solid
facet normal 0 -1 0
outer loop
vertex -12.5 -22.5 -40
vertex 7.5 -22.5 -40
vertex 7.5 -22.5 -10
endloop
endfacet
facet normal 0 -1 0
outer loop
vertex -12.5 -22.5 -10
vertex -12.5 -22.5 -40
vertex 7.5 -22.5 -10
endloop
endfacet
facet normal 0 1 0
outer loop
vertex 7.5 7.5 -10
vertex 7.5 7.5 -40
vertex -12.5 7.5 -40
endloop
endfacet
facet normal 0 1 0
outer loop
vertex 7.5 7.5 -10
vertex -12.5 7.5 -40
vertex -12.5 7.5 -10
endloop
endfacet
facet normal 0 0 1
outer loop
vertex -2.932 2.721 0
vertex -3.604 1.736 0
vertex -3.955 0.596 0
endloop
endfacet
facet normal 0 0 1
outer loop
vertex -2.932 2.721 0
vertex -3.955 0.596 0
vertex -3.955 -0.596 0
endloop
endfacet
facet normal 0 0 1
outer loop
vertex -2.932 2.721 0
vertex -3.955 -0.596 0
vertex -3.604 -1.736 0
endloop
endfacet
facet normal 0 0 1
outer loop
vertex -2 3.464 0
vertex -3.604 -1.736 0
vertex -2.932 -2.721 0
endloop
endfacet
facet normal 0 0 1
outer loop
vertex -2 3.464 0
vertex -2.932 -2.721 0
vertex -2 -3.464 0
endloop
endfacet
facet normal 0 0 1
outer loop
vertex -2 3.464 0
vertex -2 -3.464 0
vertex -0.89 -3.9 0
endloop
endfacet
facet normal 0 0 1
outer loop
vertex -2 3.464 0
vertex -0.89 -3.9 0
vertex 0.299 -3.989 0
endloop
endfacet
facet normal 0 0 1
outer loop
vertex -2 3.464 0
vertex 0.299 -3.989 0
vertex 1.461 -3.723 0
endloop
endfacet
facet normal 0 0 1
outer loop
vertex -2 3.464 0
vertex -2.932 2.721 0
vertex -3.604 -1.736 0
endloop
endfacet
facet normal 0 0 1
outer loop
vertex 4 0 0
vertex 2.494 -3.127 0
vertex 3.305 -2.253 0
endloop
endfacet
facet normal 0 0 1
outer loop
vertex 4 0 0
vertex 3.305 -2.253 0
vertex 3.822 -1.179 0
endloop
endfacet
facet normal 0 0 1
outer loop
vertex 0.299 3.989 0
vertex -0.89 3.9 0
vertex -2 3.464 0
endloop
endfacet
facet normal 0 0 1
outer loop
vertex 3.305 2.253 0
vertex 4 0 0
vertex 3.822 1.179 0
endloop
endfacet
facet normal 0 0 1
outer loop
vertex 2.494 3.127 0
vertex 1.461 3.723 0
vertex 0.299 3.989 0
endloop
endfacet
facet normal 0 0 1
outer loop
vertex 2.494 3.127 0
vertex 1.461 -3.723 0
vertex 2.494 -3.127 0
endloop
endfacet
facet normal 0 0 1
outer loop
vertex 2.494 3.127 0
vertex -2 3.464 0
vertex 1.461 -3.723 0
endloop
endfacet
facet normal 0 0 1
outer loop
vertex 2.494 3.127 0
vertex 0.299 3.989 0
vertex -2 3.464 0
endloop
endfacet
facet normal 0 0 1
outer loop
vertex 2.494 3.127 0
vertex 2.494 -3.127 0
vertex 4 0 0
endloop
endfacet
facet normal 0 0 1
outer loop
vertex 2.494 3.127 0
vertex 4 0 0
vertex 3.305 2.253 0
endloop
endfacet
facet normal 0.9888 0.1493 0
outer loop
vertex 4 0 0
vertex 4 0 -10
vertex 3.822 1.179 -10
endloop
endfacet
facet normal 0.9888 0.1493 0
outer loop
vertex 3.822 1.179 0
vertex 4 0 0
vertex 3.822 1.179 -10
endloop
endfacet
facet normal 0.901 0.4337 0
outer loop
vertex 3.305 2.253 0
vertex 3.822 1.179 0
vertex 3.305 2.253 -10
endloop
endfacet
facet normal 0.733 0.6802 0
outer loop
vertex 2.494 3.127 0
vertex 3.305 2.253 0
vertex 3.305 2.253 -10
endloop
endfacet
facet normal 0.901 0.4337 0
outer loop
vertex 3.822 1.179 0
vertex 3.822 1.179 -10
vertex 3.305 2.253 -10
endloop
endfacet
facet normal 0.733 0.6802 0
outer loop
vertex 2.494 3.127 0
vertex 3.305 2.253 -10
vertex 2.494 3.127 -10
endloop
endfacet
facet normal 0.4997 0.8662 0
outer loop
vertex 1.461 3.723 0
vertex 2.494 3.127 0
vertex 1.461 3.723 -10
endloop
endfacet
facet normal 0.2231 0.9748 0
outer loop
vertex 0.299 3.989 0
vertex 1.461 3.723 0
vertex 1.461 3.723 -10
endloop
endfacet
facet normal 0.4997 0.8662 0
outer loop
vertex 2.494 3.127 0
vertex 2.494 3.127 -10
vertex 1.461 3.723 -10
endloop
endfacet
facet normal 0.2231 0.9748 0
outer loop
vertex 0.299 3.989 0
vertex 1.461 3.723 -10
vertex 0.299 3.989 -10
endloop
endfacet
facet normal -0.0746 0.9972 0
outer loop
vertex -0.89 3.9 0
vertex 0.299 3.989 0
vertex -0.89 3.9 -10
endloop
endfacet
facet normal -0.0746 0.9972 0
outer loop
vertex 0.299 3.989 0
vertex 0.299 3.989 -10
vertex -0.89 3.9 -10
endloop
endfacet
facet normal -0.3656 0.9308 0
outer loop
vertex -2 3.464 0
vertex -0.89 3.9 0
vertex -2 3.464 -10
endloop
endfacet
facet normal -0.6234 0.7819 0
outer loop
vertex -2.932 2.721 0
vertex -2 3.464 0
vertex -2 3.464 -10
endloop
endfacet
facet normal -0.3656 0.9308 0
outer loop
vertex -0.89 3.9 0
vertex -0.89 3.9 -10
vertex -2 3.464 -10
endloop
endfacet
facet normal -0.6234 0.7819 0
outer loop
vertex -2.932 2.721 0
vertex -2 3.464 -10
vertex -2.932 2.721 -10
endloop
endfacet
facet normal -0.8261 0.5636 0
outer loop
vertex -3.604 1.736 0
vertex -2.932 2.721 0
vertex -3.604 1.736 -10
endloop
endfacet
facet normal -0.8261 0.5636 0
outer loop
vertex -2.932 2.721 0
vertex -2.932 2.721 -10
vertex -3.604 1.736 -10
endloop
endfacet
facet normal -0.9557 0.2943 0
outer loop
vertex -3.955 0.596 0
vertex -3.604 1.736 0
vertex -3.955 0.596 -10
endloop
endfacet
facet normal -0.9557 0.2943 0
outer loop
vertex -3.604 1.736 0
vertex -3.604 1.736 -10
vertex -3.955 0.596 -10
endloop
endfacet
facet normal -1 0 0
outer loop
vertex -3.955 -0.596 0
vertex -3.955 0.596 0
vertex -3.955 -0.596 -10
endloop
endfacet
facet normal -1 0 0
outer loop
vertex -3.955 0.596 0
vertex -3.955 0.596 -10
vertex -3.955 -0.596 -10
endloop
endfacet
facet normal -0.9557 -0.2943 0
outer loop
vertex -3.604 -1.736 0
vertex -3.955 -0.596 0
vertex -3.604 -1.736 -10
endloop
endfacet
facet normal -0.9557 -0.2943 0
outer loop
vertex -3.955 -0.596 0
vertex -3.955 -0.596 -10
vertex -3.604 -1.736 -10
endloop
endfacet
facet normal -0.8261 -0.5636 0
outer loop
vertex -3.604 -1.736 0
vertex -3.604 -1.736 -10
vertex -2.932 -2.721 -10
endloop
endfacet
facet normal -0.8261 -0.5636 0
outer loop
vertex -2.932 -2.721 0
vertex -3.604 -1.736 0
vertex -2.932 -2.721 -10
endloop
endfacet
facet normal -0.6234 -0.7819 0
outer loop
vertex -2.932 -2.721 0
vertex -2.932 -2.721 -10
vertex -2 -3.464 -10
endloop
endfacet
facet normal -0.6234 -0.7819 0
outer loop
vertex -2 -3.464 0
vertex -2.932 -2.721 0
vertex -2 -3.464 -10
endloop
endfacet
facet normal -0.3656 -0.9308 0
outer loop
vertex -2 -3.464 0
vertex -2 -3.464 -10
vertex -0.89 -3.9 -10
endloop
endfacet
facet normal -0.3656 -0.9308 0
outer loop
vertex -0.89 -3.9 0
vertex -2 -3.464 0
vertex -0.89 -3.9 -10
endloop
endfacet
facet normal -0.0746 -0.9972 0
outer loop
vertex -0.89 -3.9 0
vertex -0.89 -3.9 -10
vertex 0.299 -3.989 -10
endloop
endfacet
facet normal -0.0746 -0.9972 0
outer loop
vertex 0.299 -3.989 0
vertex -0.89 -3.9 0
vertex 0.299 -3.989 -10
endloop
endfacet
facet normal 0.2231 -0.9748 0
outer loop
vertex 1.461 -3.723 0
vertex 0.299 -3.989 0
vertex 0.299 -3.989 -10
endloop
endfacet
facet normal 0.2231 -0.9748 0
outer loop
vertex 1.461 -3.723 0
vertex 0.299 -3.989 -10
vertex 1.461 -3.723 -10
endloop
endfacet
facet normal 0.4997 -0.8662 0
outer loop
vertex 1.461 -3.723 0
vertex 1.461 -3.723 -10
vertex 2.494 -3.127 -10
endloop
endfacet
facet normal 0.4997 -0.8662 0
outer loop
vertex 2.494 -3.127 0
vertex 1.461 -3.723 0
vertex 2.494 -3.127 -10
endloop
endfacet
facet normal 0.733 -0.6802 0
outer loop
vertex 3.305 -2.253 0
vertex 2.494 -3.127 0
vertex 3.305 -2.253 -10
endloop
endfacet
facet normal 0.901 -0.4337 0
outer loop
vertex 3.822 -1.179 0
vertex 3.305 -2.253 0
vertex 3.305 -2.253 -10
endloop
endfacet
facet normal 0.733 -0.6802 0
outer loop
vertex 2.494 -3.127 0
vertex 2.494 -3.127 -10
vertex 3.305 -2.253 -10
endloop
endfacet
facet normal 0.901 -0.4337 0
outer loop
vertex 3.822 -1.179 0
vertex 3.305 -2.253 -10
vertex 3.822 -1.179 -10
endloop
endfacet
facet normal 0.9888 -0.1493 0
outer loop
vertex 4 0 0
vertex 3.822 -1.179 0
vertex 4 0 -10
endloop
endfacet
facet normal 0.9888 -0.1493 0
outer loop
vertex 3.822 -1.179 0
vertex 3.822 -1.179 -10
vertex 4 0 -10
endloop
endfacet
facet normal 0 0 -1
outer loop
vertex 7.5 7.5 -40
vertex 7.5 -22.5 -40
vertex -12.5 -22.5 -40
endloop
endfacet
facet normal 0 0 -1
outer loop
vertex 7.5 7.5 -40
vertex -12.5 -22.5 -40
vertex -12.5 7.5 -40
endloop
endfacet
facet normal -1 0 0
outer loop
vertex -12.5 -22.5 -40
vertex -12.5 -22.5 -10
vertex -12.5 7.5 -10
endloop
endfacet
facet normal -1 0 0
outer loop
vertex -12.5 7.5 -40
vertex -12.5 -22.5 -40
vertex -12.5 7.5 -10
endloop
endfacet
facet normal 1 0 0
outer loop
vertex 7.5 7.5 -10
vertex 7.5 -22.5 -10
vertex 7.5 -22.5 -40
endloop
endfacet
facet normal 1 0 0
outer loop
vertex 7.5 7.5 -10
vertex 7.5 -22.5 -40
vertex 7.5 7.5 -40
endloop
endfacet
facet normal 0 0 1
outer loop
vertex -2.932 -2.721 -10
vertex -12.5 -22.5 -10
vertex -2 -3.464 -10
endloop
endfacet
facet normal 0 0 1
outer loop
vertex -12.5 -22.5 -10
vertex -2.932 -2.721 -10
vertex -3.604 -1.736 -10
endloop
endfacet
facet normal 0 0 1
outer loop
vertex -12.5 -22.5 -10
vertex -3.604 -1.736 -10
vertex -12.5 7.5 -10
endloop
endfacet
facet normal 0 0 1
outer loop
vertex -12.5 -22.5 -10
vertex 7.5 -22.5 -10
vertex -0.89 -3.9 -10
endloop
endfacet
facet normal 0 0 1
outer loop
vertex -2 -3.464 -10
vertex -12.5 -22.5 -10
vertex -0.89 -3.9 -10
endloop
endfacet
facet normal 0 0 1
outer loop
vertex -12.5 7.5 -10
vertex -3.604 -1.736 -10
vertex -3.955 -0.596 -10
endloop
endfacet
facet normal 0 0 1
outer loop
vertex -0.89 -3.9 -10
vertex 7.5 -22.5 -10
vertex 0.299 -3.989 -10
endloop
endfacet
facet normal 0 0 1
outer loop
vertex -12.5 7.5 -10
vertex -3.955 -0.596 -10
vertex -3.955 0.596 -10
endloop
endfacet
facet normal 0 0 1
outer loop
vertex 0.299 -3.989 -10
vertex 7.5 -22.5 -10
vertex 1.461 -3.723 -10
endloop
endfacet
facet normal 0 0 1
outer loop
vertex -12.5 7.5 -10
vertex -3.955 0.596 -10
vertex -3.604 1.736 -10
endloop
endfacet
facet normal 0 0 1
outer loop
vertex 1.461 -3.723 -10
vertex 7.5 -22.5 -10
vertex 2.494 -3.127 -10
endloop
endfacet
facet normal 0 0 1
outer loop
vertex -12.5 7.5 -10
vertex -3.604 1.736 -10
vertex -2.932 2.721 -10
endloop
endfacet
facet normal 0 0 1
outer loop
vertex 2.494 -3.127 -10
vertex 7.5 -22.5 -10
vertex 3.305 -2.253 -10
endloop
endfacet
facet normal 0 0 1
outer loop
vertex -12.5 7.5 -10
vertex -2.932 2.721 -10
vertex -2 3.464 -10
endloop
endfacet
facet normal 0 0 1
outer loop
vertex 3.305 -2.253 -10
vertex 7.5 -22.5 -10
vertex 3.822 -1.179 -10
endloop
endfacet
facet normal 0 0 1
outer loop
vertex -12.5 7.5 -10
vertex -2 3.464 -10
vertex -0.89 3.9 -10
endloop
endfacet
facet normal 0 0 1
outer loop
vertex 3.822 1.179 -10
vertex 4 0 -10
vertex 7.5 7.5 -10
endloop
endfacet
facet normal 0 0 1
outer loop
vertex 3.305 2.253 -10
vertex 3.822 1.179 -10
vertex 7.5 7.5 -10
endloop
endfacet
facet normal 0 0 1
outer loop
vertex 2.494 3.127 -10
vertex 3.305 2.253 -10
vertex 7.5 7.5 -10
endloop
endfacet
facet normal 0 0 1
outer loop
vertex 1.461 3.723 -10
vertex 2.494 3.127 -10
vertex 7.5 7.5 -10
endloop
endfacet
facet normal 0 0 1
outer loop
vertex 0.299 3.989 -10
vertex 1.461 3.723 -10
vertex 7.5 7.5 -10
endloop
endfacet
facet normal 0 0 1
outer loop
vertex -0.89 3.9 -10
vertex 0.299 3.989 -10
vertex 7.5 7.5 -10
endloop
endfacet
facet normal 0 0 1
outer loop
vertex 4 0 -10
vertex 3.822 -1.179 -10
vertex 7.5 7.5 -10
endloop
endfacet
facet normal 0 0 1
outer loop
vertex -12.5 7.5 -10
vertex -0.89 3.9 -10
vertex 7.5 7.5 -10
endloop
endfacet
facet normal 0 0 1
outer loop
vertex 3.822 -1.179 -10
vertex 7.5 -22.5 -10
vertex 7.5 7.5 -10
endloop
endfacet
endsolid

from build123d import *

# Parameters (mm, degrees)
SKETCH002_R  = 4
PAD001_DEPTH = 10
SKETCH_W     = 30
SKETCH_H     = 30
PAD_DEPTH    = 20


with BuildPart() as pad001:
    # Sketch002 → Pad001 (new body)
    with BuildSketch(Plane.XY.offset(-10)):
        Circle(SKETCH002_R)
    extrude(amount=PAD001_DEPTH)


with BuildPart() as fusion004:
    # Sketch → Pad (new body)
    with BuildSketch(Plane.YZ.offset(7.5)):
        with Locations((-7.5, -25)):
            Rectangle(SKETCH_W, SKETCH_H)
    extrude(amount=-PAD_DEPTH)

    # Fusion004: union Pad001
    add(pad001.part)


solid = fusion004.part
